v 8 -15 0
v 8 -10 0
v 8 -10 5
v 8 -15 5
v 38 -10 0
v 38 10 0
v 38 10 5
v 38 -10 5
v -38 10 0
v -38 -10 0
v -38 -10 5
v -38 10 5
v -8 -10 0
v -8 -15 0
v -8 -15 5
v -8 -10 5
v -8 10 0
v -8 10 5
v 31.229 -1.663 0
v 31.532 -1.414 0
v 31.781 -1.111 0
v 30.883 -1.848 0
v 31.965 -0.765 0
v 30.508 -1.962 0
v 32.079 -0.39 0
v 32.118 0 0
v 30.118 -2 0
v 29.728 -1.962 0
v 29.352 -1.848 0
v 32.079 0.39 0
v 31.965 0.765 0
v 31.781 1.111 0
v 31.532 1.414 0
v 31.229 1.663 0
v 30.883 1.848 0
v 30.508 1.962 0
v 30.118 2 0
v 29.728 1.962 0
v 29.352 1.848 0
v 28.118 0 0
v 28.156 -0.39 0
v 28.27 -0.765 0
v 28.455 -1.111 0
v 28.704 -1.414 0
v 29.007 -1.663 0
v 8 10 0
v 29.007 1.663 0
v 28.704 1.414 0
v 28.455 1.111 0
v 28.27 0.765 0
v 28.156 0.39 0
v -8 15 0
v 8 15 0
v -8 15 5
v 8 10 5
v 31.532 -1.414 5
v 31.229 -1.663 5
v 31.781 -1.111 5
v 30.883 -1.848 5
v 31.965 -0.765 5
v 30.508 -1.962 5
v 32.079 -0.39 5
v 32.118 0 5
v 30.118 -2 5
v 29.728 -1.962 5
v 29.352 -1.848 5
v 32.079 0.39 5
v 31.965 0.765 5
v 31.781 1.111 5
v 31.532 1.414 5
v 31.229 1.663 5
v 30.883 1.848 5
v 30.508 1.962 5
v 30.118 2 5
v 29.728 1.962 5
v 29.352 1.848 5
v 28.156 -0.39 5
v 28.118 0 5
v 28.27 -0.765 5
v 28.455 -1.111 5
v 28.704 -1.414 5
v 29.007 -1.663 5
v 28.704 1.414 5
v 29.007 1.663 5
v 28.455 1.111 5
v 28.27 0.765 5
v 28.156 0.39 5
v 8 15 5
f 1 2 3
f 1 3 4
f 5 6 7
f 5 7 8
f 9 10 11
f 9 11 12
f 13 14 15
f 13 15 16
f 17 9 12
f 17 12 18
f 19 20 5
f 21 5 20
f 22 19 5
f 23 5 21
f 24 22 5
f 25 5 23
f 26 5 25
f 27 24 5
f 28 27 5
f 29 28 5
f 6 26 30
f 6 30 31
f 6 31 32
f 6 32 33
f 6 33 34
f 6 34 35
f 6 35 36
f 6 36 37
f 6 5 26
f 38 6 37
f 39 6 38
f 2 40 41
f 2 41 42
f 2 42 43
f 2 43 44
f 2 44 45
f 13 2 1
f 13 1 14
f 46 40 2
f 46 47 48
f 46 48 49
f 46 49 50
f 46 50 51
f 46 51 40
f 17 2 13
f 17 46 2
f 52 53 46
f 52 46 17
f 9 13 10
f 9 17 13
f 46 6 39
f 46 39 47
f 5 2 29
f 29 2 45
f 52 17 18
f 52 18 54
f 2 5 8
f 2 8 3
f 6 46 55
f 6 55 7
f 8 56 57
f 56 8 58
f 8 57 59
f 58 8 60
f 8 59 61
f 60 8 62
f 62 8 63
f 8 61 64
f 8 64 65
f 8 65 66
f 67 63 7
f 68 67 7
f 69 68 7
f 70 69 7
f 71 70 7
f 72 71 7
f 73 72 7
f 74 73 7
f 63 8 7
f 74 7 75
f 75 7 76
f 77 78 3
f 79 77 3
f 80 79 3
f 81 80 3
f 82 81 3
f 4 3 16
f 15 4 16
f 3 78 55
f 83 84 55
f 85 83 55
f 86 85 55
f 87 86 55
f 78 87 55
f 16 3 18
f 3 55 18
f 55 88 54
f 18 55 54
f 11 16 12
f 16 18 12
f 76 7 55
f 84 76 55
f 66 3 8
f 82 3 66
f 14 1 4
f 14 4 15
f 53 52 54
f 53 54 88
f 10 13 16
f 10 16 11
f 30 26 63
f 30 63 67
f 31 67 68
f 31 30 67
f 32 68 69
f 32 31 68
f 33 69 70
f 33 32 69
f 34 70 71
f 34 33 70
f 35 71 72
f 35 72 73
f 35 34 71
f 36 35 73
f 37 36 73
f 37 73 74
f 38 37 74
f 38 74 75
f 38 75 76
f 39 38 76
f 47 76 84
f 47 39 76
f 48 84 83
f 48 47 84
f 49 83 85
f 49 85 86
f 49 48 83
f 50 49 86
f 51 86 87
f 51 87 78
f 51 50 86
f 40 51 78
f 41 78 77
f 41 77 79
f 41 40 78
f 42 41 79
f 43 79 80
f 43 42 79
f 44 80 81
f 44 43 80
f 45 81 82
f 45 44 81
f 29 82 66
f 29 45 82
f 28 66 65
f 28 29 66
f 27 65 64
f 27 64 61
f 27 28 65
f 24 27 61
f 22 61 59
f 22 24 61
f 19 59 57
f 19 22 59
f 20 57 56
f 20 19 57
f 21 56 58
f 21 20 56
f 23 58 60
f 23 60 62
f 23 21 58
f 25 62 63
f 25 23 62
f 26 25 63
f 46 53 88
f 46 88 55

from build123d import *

# Parameters (mm, degrees)
SKETCH1_R           = 2
BOSS_EXTRUDE1_DEPTH = 5


with BuildPart() as part:
    # Sketch1 → Boss-Extrude1 (new body)
    with BuildSketch(Plane.XY):
        Polygon((-8, 10), (-8, 15), (8, 15), (8, 10), (38, 10), (38, -10), (8, -10), (8, -15), (-8, -15), (-8, -10), (-38, -10), (-38, 10), align=None)
        with Locations((30.117717463, 0)):
            Circle(SKETCH1_R, mode=Mode.SUBTRACT)
    extrude(amount=BOSS_EXTRUDE1_DEPTH)


solid = part.part
